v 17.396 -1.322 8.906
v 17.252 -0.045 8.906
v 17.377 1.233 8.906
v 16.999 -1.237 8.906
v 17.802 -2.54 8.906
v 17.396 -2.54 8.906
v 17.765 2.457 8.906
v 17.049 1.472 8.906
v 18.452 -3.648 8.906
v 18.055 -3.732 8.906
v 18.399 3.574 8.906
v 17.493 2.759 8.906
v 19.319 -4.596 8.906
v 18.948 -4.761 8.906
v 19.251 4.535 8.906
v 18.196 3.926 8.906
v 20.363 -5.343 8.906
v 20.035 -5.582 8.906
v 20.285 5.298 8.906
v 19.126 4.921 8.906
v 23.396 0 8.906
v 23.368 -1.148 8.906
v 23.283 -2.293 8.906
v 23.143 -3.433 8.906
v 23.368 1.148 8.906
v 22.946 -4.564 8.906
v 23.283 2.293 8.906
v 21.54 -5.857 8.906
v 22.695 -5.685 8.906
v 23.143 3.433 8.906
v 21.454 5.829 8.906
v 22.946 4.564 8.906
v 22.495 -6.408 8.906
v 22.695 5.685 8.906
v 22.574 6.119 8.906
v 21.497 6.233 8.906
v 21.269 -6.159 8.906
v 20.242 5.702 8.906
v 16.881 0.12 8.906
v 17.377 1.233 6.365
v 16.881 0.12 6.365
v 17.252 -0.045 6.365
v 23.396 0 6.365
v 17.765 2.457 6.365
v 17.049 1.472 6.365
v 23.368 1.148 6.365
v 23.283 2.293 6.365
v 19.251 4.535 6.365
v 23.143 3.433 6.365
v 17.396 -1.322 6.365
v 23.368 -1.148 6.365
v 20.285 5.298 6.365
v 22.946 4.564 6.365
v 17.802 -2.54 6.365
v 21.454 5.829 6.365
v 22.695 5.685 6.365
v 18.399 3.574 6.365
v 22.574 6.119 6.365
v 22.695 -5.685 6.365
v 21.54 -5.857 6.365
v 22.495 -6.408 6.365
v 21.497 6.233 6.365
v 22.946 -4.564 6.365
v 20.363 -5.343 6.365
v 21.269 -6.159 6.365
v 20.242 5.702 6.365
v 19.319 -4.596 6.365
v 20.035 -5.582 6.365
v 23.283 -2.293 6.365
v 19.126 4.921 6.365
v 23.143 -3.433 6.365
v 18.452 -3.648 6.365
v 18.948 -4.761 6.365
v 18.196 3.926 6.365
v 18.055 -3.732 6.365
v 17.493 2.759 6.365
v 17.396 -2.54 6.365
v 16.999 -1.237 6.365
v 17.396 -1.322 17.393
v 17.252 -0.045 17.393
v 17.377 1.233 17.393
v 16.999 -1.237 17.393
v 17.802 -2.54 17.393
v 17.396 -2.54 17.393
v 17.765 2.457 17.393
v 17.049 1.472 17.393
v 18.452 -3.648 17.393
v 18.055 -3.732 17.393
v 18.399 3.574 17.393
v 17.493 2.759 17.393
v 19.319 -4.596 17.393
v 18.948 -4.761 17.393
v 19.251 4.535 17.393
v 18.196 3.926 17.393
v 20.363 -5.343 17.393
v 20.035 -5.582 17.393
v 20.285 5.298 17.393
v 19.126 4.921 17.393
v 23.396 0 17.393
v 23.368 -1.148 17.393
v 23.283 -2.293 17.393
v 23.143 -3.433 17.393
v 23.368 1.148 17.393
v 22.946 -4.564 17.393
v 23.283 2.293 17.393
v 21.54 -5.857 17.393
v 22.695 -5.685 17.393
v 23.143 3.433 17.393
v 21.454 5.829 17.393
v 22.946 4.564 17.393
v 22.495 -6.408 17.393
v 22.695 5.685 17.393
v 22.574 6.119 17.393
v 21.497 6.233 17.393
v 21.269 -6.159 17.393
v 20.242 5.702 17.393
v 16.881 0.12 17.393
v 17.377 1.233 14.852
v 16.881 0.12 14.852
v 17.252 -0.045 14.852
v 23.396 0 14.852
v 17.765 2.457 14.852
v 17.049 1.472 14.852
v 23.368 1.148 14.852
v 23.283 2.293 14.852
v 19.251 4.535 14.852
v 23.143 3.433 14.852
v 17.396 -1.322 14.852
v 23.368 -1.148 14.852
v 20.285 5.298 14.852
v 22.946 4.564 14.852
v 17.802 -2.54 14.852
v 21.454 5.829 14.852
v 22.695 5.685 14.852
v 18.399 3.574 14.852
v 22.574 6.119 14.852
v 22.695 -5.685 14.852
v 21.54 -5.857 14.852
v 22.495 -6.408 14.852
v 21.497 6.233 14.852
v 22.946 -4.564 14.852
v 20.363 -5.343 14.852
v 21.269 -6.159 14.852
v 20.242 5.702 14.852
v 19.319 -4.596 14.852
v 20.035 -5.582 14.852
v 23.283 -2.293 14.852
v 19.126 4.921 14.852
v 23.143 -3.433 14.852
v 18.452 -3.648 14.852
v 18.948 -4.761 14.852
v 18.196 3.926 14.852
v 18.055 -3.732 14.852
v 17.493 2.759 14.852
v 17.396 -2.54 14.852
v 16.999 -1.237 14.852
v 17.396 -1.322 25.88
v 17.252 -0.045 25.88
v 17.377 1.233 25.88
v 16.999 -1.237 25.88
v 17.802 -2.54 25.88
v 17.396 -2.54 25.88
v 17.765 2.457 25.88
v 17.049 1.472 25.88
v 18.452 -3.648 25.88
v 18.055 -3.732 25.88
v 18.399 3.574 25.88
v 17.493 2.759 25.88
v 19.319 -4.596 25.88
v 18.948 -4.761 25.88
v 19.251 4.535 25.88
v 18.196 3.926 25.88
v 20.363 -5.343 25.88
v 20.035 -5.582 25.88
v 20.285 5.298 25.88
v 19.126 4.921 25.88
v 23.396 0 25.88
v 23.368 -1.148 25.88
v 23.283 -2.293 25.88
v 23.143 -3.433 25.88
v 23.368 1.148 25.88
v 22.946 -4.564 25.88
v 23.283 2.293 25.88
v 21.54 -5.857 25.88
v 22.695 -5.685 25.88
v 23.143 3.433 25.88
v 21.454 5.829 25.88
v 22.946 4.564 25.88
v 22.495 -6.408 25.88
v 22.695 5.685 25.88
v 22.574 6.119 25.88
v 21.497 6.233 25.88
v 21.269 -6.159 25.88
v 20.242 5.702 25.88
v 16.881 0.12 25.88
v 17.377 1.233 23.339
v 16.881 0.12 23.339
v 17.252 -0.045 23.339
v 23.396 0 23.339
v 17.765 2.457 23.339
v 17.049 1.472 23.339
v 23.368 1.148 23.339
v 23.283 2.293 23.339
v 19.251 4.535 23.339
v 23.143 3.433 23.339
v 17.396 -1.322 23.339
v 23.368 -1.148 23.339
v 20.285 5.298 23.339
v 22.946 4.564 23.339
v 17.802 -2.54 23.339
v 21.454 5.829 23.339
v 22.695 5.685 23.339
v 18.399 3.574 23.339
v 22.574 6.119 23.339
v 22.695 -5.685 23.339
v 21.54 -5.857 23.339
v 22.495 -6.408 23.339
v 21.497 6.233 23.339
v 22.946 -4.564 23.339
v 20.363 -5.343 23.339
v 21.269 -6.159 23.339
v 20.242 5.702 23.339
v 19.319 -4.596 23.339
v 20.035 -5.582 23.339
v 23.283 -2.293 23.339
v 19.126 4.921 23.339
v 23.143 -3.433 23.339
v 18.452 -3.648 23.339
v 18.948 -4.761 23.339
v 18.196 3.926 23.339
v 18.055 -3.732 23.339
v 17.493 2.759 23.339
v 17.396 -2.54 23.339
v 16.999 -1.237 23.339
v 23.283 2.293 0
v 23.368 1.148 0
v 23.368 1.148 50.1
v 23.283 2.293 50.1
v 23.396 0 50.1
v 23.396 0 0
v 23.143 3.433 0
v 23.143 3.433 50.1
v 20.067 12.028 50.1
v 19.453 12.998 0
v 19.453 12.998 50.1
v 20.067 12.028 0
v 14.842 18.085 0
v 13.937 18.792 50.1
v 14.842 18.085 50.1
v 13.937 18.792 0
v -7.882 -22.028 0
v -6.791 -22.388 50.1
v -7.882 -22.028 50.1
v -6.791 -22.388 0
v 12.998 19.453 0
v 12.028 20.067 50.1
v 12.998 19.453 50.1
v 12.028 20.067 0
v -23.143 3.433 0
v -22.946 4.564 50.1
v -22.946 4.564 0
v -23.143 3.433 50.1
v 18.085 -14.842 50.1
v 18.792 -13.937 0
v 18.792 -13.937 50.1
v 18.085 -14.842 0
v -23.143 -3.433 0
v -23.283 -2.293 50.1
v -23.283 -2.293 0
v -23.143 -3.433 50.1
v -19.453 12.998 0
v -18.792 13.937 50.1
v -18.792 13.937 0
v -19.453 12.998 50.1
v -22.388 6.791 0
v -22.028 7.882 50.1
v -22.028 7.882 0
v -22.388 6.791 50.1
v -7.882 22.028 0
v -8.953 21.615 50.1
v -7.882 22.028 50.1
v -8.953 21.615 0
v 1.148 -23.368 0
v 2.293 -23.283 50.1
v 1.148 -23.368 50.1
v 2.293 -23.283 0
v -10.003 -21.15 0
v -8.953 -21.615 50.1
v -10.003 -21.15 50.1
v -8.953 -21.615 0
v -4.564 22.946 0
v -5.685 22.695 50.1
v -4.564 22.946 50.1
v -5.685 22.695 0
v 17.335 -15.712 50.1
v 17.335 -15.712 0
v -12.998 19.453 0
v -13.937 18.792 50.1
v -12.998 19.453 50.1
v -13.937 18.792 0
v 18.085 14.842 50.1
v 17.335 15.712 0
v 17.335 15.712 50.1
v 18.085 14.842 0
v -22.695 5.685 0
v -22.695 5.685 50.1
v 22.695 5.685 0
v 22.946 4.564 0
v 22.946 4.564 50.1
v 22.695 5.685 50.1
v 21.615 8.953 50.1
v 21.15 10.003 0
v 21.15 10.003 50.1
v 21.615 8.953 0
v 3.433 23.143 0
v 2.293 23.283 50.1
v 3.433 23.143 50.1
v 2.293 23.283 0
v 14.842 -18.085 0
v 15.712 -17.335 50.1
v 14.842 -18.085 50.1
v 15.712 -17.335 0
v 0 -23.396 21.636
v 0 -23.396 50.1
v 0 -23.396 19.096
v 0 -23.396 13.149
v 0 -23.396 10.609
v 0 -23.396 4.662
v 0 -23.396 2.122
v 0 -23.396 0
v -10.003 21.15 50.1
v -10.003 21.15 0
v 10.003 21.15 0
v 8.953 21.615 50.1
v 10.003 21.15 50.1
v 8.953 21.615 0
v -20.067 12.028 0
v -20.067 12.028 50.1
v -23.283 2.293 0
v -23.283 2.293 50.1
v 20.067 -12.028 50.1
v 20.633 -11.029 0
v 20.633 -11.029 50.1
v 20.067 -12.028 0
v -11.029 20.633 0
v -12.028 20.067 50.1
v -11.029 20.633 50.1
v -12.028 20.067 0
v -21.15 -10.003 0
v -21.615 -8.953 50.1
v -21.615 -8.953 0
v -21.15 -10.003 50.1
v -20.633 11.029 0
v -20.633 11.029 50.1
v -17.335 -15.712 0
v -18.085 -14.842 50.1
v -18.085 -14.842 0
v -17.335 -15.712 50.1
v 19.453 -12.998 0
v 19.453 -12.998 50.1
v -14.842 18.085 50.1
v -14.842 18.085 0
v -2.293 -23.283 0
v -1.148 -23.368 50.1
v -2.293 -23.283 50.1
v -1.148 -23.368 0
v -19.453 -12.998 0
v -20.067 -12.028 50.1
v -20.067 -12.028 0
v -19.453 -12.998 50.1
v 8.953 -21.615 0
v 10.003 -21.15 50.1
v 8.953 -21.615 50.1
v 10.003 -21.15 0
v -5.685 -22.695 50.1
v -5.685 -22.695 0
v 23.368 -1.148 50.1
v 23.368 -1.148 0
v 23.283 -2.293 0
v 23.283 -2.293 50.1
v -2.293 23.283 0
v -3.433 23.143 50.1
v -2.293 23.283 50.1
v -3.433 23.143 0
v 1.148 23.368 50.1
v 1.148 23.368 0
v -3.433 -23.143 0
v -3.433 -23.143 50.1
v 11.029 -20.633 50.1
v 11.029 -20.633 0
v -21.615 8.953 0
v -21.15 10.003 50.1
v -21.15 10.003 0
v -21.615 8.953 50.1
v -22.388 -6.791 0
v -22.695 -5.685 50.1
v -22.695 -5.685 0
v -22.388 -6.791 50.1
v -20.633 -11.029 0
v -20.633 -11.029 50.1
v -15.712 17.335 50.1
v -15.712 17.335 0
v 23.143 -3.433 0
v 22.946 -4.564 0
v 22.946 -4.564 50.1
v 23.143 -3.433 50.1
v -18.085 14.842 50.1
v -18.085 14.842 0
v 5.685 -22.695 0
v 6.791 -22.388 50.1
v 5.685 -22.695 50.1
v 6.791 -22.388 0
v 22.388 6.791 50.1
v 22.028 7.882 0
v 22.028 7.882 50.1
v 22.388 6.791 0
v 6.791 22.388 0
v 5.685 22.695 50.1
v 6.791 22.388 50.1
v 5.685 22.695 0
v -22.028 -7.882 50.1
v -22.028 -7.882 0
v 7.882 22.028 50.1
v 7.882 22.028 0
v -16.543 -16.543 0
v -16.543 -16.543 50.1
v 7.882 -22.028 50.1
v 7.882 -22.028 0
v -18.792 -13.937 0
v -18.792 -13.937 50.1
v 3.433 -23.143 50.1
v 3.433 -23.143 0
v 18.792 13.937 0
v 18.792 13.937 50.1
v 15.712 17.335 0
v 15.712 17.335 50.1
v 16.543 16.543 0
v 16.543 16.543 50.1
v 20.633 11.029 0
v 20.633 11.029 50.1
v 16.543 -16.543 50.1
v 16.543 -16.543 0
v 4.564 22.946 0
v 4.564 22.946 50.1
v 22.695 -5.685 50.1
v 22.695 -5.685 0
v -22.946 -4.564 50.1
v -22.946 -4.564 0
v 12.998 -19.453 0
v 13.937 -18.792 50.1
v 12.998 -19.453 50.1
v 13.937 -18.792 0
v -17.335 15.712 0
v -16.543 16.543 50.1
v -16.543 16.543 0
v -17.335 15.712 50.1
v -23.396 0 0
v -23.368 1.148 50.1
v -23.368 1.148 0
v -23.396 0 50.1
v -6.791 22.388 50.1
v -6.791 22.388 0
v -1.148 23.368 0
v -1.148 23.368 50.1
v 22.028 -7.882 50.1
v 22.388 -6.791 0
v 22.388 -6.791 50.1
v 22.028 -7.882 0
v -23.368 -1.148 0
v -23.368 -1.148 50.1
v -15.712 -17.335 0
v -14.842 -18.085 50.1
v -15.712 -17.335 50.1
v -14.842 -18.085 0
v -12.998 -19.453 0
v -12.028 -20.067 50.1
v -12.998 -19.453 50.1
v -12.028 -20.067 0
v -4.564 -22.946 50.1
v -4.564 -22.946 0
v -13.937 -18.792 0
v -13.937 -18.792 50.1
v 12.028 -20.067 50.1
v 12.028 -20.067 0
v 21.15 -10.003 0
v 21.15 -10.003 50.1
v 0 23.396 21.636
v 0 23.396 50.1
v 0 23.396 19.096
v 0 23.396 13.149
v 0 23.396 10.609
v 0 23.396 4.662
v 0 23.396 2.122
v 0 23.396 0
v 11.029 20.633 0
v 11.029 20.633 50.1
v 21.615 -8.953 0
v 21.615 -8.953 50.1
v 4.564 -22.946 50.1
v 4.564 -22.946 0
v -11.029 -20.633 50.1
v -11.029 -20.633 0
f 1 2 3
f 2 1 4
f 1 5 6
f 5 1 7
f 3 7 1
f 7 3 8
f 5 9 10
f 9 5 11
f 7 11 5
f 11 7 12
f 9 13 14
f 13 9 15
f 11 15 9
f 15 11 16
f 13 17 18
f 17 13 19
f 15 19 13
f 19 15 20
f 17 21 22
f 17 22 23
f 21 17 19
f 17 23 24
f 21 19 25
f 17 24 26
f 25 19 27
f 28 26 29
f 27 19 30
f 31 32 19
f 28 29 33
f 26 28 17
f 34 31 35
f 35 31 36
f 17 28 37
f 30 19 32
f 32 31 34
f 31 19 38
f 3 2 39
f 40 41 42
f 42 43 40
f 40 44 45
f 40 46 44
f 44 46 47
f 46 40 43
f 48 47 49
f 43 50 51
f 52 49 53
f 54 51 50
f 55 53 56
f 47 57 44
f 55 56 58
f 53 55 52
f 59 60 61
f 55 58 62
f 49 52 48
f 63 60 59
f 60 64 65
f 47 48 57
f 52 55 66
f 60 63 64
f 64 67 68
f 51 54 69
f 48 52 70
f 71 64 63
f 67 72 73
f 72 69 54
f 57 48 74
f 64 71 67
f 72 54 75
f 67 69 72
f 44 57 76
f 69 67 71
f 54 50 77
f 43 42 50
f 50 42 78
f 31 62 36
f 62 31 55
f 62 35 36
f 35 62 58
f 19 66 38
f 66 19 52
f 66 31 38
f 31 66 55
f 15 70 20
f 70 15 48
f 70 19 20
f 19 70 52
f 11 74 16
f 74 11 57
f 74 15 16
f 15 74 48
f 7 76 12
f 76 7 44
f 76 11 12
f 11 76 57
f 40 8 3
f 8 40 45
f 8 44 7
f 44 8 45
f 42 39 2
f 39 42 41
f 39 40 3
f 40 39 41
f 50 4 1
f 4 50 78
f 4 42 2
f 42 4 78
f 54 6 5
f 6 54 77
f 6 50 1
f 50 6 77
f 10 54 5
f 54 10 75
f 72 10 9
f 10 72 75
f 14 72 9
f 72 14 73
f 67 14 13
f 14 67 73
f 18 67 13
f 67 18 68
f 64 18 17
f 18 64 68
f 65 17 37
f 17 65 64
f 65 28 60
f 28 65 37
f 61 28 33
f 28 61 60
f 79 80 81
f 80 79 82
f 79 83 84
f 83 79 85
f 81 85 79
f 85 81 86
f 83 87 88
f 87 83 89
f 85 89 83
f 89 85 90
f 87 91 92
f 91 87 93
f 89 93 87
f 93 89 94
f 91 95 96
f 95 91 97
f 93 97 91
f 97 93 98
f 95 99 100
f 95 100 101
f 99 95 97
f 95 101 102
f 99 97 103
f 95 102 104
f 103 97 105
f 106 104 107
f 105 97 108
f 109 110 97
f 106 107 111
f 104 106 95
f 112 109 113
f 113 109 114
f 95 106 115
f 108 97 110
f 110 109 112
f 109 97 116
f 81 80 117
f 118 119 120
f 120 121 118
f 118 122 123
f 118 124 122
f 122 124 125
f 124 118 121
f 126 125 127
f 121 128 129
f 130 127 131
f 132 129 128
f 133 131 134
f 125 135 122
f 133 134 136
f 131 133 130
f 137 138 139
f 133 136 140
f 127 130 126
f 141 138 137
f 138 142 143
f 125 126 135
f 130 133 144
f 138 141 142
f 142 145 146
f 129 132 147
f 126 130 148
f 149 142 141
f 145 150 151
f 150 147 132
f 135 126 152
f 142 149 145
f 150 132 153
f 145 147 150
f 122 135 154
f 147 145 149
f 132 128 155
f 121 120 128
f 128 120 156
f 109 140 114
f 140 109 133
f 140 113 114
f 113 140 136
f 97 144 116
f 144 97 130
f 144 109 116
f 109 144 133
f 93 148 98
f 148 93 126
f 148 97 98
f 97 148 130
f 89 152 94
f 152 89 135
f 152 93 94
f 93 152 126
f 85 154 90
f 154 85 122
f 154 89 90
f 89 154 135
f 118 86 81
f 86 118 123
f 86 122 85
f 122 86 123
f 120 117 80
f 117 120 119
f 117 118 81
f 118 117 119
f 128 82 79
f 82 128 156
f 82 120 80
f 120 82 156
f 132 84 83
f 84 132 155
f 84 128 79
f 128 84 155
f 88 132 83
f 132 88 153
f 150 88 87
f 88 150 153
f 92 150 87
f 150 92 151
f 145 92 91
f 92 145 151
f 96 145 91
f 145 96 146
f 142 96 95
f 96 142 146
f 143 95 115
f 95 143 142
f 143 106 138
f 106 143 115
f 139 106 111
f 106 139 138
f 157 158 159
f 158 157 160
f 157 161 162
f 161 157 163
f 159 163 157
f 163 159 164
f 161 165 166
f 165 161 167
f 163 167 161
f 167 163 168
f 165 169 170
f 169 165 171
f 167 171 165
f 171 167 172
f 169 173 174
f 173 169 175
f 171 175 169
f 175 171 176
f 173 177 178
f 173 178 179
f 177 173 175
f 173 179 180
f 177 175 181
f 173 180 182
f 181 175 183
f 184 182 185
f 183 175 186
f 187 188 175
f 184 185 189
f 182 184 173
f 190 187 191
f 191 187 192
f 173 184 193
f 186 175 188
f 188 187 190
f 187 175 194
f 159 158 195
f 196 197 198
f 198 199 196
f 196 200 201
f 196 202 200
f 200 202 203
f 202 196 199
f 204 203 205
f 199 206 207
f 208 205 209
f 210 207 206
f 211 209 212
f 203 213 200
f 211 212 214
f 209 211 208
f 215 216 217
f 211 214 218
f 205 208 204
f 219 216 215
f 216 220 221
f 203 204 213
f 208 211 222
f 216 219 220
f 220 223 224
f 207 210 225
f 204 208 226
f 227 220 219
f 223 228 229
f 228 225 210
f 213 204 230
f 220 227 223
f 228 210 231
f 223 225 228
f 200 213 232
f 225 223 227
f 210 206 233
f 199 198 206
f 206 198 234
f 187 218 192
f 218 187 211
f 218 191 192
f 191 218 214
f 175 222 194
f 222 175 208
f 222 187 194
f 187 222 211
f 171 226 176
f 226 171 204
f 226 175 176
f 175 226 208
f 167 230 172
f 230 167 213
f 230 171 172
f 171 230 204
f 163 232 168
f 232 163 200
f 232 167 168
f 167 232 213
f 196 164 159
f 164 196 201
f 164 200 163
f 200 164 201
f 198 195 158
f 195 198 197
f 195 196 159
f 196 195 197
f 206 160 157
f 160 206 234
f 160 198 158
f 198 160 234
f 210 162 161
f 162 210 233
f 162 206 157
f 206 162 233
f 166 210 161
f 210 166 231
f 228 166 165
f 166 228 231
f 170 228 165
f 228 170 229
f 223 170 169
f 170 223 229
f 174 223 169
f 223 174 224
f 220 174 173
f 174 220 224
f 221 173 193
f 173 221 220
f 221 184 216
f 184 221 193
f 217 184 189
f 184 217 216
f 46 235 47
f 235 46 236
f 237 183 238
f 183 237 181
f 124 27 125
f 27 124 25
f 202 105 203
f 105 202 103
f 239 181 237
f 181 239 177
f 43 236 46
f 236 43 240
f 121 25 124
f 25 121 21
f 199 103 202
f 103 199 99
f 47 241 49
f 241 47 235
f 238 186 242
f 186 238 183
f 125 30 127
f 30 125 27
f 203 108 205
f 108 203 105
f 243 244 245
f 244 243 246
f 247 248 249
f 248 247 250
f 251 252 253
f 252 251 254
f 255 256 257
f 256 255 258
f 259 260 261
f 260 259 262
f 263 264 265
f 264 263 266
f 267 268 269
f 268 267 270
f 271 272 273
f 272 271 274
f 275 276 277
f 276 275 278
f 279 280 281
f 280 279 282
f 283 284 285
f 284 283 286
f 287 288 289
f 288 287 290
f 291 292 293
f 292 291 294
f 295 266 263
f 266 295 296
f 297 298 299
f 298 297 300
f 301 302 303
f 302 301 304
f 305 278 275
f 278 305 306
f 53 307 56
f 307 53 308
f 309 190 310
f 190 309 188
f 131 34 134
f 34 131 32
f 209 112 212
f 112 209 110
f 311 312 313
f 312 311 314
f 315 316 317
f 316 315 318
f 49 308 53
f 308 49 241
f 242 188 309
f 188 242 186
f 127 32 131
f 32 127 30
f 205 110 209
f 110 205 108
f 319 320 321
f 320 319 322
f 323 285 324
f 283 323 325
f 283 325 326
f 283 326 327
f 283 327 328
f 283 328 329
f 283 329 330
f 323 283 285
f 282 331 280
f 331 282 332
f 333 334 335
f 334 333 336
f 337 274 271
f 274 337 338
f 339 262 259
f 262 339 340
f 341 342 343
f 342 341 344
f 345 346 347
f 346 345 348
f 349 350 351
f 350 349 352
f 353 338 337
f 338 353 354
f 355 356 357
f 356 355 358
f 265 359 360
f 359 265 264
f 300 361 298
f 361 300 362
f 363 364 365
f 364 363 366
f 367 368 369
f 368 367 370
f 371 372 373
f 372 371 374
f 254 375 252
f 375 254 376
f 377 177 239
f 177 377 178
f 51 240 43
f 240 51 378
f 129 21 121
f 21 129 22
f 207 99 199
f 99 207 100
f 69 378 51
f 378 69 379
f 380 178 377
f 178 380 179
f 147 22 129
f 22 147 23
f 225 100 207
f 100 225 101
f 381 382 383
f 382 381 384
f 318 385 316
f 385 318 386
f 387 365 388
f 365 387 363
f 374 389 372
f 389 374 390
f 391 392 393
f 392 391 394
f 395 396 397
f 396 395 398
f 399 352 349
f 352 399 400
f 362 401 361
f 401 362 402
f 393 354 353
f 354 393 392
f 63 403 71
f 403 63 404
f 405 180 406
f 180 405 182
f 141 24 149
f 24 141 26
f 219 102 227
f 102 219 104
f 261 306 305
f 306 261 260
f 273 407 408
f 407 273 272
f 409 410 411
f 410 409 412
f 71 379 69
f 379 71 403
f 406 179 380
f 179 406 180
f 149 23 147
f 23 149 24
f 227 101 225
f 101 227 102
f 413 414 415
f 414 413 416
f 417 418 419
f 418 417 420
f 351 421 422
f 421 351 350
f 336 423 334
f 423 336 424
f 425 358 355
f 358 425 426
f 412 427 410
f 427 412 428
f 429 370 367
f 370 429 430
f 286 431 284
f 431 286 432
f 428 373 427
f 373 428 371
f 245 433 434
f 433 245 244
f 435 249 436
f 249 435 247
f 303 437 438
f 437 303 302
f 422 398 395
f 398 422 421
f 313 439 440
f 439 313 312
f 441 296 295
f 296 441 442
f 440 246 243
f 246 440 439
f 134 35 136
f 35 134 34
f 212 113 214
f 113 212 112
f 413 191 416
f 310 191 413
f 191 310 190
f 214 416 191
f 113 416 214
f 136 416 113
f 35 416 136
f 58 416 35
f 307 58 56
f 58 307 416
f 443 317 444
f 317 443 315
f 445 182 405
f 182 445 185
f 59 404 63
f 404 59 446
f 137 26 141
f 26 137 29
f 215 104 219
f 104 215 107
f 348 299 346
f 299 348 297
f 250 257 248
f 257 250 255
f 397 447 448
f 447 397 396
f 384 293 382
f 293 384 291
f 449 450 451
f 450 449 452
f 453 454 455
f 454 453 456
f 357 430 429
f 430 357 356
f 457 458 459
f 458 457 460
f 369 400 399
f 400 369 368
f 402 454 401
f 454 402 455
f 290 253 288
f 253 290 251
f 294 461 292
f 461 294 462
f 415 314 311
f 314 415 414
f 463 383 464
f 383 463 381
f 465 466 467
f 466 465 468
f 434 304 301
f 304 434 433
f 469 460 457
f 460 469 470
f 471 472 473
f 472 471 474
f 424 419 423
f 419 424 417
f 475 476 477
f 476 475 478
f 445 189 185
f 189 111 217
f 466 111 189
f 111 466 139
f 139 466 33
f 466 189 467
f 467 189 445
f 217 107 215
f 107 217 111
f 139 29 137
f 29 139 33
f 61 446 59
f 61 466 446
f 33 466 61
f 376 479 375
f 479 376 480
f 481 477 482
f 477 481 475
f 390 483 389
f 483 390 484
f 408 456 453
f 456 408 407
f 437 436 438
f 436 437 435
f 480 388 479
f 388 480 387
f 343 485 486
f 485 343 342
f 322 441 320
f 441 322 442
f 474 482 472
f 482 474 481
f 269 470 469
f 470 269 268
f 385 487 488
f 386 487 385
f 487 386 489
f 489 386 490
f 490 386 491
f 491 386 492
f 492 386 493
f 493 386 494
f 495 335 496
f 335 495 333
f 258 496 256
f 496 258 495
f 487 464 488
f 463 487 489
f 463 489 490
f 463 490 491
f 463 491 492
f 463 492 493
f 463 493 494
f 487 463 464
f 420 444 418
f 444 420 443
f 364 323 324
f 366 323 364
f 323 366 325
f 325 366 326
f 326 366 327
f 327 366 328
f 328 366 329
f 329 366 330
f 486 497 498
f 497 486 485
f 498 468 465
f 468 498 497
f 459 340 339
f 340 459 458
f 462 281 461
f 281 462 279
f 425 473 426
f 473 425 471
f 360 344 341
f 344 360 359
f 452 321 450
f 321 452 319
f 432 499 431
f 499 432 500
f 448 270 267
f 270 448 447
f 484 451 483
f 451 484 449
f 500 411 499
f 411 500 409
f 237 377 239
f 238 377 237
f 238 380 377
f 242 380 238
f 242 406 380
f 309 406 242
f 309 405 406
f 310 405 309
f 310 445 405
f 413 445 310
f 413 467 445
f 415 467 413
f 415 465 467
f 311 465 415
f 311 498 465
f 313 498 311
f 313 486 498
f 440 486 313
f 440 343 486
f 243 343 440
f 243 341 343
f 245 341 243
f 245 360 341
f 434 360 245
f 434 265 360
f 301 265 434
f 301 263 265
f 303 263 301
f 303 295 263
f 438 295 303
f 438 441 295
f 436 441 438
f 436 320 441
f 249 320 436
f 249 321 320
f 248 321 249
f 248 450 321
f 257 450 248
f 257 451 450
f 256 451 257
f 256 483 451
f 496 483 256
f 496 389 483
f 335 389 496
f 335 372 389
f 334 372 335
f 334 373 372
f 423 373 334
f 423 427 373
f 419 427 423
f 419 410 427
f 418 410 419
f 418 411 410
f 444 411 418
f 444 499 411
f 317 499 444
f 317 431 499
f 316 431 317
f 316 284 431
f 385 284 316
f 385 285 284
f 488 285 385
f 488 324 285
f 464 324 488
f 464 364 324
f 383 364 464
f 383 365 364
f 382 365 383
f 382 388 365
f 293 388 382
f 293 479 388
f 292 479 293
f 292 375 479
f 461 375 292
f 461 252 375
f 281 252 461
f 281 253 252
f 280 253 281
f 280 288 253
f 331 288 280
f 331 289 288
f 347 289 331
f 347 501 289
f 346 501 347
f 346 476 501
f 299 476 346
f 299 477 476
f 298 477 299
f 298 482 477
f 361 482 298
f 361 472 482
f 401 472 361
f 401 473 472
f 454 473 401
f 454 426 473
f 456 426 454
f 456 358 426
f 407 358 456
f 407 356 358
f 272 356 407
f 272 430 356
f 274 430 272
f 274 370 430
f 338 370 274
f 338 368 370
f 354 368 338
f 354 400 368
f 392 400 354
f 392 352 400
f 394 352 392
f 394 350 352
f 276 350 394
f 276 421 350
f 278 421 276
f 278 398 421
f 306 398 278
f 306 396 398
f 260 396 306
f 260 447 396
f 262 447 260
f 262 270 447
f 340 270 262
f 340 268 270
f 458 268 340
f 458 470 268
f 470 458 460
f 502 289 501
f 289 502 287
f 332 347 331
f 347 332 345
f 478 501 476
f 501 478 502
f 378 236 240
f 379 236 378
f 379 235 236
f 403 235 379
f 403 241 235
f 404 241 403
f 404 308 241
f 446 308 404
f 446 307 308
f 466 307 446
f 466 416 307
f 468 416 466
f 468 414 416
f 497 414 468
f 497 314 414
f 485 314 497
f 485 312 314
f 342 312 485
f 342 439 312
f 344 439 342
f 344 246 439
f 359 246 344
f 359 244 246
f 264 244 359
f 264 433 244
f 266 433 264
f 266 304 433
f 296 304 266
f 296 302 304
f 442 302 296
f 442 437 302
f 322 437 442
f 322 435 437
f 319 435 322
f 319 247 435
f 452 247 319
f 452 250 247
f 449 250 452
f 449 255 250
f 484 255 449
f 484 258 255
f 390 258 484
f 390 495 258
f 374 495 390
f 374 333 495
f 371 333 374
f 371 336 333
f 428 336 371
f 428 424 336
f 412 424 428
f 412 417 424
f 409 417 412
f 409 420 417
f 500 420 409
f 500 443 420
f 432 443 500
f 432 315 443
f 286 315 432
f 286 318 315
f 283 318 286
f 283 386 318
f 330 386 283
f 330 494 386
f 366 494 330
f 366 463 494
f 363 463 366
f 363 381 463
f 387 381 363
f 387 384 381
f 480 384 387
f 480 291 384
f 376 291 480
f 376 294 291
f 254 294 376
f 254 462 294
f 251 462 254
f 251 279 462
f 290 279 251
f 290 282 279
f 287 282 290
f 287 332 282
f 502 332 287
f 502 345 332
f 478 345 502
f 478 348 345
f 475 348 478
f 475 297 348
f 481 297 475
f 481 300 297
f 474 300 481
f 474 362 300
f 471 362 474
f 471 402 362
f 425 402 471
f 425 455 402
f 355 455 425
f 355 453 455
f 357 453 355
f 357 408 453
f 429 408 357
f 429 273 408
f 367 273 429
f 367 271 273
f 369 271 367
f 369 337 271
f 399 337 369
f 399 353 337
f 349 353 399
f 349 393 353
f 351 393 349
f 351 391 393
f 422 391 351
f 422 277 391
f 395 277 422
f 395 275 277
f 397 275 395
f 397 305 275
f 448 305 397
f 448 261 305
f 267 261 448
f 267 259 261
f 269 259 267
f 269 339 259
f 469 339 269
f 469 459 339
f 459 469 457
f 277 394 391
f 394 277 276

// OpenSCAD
h=50;			//	cylinder height
n=30;			//	number of honeycombs on a circle
dw=4.9;		//	distance between honeycomb faces
h1=3;			// Höhe pro Zelle
w=0.5;		//	Abstand der Zellen
an=0;  // Winkel zur Oberfläche
$fn=32;

// Winkel pro Zelle
ds=(dw-w)/sin(360/6);
// Kreisdurchmesser
dc=((n*dw)/(2*PI))*2;
dh=dw*sin(360/6);


module st() {
	difference() {
		translate([dc/2, 0,0]) cube([h1*2, ds/2, ds/2]);// rotate([0,90,0]) cylinder(h1*2, ds/2, ds/2, $fn=6, true);
		/*for (r1=[0:2])
			translate([dc/2+h1, 0,0]) rotate([r1*120,0,0]) rotate([0,-an,0]) translate([0.01,-dw/2,0]) cube([h1*2,dw,dw]);*/
		}/// df

} // mod st;

module sotc() {
	difference() {
		cylinder(h+0.1, dc/2, dc/2, $fn=128);
		for (hn=[dh:dh*2:h/2+dh])
			translate([0,0,hn])
			for (r=[0:n-1]) {
				translate([dc/2, 0,0])
					translate([0,0,dh/2]) rotate([0,0,360/n*r]) cube([h1*2, ds/2, ds/2]);
						translate([0,0,-dh/2]) rotate([0,0,360/n/2]) rotate([0,0,360/n*r]) st();
			} // for
	} // df
} // mod sotc


sotc();
